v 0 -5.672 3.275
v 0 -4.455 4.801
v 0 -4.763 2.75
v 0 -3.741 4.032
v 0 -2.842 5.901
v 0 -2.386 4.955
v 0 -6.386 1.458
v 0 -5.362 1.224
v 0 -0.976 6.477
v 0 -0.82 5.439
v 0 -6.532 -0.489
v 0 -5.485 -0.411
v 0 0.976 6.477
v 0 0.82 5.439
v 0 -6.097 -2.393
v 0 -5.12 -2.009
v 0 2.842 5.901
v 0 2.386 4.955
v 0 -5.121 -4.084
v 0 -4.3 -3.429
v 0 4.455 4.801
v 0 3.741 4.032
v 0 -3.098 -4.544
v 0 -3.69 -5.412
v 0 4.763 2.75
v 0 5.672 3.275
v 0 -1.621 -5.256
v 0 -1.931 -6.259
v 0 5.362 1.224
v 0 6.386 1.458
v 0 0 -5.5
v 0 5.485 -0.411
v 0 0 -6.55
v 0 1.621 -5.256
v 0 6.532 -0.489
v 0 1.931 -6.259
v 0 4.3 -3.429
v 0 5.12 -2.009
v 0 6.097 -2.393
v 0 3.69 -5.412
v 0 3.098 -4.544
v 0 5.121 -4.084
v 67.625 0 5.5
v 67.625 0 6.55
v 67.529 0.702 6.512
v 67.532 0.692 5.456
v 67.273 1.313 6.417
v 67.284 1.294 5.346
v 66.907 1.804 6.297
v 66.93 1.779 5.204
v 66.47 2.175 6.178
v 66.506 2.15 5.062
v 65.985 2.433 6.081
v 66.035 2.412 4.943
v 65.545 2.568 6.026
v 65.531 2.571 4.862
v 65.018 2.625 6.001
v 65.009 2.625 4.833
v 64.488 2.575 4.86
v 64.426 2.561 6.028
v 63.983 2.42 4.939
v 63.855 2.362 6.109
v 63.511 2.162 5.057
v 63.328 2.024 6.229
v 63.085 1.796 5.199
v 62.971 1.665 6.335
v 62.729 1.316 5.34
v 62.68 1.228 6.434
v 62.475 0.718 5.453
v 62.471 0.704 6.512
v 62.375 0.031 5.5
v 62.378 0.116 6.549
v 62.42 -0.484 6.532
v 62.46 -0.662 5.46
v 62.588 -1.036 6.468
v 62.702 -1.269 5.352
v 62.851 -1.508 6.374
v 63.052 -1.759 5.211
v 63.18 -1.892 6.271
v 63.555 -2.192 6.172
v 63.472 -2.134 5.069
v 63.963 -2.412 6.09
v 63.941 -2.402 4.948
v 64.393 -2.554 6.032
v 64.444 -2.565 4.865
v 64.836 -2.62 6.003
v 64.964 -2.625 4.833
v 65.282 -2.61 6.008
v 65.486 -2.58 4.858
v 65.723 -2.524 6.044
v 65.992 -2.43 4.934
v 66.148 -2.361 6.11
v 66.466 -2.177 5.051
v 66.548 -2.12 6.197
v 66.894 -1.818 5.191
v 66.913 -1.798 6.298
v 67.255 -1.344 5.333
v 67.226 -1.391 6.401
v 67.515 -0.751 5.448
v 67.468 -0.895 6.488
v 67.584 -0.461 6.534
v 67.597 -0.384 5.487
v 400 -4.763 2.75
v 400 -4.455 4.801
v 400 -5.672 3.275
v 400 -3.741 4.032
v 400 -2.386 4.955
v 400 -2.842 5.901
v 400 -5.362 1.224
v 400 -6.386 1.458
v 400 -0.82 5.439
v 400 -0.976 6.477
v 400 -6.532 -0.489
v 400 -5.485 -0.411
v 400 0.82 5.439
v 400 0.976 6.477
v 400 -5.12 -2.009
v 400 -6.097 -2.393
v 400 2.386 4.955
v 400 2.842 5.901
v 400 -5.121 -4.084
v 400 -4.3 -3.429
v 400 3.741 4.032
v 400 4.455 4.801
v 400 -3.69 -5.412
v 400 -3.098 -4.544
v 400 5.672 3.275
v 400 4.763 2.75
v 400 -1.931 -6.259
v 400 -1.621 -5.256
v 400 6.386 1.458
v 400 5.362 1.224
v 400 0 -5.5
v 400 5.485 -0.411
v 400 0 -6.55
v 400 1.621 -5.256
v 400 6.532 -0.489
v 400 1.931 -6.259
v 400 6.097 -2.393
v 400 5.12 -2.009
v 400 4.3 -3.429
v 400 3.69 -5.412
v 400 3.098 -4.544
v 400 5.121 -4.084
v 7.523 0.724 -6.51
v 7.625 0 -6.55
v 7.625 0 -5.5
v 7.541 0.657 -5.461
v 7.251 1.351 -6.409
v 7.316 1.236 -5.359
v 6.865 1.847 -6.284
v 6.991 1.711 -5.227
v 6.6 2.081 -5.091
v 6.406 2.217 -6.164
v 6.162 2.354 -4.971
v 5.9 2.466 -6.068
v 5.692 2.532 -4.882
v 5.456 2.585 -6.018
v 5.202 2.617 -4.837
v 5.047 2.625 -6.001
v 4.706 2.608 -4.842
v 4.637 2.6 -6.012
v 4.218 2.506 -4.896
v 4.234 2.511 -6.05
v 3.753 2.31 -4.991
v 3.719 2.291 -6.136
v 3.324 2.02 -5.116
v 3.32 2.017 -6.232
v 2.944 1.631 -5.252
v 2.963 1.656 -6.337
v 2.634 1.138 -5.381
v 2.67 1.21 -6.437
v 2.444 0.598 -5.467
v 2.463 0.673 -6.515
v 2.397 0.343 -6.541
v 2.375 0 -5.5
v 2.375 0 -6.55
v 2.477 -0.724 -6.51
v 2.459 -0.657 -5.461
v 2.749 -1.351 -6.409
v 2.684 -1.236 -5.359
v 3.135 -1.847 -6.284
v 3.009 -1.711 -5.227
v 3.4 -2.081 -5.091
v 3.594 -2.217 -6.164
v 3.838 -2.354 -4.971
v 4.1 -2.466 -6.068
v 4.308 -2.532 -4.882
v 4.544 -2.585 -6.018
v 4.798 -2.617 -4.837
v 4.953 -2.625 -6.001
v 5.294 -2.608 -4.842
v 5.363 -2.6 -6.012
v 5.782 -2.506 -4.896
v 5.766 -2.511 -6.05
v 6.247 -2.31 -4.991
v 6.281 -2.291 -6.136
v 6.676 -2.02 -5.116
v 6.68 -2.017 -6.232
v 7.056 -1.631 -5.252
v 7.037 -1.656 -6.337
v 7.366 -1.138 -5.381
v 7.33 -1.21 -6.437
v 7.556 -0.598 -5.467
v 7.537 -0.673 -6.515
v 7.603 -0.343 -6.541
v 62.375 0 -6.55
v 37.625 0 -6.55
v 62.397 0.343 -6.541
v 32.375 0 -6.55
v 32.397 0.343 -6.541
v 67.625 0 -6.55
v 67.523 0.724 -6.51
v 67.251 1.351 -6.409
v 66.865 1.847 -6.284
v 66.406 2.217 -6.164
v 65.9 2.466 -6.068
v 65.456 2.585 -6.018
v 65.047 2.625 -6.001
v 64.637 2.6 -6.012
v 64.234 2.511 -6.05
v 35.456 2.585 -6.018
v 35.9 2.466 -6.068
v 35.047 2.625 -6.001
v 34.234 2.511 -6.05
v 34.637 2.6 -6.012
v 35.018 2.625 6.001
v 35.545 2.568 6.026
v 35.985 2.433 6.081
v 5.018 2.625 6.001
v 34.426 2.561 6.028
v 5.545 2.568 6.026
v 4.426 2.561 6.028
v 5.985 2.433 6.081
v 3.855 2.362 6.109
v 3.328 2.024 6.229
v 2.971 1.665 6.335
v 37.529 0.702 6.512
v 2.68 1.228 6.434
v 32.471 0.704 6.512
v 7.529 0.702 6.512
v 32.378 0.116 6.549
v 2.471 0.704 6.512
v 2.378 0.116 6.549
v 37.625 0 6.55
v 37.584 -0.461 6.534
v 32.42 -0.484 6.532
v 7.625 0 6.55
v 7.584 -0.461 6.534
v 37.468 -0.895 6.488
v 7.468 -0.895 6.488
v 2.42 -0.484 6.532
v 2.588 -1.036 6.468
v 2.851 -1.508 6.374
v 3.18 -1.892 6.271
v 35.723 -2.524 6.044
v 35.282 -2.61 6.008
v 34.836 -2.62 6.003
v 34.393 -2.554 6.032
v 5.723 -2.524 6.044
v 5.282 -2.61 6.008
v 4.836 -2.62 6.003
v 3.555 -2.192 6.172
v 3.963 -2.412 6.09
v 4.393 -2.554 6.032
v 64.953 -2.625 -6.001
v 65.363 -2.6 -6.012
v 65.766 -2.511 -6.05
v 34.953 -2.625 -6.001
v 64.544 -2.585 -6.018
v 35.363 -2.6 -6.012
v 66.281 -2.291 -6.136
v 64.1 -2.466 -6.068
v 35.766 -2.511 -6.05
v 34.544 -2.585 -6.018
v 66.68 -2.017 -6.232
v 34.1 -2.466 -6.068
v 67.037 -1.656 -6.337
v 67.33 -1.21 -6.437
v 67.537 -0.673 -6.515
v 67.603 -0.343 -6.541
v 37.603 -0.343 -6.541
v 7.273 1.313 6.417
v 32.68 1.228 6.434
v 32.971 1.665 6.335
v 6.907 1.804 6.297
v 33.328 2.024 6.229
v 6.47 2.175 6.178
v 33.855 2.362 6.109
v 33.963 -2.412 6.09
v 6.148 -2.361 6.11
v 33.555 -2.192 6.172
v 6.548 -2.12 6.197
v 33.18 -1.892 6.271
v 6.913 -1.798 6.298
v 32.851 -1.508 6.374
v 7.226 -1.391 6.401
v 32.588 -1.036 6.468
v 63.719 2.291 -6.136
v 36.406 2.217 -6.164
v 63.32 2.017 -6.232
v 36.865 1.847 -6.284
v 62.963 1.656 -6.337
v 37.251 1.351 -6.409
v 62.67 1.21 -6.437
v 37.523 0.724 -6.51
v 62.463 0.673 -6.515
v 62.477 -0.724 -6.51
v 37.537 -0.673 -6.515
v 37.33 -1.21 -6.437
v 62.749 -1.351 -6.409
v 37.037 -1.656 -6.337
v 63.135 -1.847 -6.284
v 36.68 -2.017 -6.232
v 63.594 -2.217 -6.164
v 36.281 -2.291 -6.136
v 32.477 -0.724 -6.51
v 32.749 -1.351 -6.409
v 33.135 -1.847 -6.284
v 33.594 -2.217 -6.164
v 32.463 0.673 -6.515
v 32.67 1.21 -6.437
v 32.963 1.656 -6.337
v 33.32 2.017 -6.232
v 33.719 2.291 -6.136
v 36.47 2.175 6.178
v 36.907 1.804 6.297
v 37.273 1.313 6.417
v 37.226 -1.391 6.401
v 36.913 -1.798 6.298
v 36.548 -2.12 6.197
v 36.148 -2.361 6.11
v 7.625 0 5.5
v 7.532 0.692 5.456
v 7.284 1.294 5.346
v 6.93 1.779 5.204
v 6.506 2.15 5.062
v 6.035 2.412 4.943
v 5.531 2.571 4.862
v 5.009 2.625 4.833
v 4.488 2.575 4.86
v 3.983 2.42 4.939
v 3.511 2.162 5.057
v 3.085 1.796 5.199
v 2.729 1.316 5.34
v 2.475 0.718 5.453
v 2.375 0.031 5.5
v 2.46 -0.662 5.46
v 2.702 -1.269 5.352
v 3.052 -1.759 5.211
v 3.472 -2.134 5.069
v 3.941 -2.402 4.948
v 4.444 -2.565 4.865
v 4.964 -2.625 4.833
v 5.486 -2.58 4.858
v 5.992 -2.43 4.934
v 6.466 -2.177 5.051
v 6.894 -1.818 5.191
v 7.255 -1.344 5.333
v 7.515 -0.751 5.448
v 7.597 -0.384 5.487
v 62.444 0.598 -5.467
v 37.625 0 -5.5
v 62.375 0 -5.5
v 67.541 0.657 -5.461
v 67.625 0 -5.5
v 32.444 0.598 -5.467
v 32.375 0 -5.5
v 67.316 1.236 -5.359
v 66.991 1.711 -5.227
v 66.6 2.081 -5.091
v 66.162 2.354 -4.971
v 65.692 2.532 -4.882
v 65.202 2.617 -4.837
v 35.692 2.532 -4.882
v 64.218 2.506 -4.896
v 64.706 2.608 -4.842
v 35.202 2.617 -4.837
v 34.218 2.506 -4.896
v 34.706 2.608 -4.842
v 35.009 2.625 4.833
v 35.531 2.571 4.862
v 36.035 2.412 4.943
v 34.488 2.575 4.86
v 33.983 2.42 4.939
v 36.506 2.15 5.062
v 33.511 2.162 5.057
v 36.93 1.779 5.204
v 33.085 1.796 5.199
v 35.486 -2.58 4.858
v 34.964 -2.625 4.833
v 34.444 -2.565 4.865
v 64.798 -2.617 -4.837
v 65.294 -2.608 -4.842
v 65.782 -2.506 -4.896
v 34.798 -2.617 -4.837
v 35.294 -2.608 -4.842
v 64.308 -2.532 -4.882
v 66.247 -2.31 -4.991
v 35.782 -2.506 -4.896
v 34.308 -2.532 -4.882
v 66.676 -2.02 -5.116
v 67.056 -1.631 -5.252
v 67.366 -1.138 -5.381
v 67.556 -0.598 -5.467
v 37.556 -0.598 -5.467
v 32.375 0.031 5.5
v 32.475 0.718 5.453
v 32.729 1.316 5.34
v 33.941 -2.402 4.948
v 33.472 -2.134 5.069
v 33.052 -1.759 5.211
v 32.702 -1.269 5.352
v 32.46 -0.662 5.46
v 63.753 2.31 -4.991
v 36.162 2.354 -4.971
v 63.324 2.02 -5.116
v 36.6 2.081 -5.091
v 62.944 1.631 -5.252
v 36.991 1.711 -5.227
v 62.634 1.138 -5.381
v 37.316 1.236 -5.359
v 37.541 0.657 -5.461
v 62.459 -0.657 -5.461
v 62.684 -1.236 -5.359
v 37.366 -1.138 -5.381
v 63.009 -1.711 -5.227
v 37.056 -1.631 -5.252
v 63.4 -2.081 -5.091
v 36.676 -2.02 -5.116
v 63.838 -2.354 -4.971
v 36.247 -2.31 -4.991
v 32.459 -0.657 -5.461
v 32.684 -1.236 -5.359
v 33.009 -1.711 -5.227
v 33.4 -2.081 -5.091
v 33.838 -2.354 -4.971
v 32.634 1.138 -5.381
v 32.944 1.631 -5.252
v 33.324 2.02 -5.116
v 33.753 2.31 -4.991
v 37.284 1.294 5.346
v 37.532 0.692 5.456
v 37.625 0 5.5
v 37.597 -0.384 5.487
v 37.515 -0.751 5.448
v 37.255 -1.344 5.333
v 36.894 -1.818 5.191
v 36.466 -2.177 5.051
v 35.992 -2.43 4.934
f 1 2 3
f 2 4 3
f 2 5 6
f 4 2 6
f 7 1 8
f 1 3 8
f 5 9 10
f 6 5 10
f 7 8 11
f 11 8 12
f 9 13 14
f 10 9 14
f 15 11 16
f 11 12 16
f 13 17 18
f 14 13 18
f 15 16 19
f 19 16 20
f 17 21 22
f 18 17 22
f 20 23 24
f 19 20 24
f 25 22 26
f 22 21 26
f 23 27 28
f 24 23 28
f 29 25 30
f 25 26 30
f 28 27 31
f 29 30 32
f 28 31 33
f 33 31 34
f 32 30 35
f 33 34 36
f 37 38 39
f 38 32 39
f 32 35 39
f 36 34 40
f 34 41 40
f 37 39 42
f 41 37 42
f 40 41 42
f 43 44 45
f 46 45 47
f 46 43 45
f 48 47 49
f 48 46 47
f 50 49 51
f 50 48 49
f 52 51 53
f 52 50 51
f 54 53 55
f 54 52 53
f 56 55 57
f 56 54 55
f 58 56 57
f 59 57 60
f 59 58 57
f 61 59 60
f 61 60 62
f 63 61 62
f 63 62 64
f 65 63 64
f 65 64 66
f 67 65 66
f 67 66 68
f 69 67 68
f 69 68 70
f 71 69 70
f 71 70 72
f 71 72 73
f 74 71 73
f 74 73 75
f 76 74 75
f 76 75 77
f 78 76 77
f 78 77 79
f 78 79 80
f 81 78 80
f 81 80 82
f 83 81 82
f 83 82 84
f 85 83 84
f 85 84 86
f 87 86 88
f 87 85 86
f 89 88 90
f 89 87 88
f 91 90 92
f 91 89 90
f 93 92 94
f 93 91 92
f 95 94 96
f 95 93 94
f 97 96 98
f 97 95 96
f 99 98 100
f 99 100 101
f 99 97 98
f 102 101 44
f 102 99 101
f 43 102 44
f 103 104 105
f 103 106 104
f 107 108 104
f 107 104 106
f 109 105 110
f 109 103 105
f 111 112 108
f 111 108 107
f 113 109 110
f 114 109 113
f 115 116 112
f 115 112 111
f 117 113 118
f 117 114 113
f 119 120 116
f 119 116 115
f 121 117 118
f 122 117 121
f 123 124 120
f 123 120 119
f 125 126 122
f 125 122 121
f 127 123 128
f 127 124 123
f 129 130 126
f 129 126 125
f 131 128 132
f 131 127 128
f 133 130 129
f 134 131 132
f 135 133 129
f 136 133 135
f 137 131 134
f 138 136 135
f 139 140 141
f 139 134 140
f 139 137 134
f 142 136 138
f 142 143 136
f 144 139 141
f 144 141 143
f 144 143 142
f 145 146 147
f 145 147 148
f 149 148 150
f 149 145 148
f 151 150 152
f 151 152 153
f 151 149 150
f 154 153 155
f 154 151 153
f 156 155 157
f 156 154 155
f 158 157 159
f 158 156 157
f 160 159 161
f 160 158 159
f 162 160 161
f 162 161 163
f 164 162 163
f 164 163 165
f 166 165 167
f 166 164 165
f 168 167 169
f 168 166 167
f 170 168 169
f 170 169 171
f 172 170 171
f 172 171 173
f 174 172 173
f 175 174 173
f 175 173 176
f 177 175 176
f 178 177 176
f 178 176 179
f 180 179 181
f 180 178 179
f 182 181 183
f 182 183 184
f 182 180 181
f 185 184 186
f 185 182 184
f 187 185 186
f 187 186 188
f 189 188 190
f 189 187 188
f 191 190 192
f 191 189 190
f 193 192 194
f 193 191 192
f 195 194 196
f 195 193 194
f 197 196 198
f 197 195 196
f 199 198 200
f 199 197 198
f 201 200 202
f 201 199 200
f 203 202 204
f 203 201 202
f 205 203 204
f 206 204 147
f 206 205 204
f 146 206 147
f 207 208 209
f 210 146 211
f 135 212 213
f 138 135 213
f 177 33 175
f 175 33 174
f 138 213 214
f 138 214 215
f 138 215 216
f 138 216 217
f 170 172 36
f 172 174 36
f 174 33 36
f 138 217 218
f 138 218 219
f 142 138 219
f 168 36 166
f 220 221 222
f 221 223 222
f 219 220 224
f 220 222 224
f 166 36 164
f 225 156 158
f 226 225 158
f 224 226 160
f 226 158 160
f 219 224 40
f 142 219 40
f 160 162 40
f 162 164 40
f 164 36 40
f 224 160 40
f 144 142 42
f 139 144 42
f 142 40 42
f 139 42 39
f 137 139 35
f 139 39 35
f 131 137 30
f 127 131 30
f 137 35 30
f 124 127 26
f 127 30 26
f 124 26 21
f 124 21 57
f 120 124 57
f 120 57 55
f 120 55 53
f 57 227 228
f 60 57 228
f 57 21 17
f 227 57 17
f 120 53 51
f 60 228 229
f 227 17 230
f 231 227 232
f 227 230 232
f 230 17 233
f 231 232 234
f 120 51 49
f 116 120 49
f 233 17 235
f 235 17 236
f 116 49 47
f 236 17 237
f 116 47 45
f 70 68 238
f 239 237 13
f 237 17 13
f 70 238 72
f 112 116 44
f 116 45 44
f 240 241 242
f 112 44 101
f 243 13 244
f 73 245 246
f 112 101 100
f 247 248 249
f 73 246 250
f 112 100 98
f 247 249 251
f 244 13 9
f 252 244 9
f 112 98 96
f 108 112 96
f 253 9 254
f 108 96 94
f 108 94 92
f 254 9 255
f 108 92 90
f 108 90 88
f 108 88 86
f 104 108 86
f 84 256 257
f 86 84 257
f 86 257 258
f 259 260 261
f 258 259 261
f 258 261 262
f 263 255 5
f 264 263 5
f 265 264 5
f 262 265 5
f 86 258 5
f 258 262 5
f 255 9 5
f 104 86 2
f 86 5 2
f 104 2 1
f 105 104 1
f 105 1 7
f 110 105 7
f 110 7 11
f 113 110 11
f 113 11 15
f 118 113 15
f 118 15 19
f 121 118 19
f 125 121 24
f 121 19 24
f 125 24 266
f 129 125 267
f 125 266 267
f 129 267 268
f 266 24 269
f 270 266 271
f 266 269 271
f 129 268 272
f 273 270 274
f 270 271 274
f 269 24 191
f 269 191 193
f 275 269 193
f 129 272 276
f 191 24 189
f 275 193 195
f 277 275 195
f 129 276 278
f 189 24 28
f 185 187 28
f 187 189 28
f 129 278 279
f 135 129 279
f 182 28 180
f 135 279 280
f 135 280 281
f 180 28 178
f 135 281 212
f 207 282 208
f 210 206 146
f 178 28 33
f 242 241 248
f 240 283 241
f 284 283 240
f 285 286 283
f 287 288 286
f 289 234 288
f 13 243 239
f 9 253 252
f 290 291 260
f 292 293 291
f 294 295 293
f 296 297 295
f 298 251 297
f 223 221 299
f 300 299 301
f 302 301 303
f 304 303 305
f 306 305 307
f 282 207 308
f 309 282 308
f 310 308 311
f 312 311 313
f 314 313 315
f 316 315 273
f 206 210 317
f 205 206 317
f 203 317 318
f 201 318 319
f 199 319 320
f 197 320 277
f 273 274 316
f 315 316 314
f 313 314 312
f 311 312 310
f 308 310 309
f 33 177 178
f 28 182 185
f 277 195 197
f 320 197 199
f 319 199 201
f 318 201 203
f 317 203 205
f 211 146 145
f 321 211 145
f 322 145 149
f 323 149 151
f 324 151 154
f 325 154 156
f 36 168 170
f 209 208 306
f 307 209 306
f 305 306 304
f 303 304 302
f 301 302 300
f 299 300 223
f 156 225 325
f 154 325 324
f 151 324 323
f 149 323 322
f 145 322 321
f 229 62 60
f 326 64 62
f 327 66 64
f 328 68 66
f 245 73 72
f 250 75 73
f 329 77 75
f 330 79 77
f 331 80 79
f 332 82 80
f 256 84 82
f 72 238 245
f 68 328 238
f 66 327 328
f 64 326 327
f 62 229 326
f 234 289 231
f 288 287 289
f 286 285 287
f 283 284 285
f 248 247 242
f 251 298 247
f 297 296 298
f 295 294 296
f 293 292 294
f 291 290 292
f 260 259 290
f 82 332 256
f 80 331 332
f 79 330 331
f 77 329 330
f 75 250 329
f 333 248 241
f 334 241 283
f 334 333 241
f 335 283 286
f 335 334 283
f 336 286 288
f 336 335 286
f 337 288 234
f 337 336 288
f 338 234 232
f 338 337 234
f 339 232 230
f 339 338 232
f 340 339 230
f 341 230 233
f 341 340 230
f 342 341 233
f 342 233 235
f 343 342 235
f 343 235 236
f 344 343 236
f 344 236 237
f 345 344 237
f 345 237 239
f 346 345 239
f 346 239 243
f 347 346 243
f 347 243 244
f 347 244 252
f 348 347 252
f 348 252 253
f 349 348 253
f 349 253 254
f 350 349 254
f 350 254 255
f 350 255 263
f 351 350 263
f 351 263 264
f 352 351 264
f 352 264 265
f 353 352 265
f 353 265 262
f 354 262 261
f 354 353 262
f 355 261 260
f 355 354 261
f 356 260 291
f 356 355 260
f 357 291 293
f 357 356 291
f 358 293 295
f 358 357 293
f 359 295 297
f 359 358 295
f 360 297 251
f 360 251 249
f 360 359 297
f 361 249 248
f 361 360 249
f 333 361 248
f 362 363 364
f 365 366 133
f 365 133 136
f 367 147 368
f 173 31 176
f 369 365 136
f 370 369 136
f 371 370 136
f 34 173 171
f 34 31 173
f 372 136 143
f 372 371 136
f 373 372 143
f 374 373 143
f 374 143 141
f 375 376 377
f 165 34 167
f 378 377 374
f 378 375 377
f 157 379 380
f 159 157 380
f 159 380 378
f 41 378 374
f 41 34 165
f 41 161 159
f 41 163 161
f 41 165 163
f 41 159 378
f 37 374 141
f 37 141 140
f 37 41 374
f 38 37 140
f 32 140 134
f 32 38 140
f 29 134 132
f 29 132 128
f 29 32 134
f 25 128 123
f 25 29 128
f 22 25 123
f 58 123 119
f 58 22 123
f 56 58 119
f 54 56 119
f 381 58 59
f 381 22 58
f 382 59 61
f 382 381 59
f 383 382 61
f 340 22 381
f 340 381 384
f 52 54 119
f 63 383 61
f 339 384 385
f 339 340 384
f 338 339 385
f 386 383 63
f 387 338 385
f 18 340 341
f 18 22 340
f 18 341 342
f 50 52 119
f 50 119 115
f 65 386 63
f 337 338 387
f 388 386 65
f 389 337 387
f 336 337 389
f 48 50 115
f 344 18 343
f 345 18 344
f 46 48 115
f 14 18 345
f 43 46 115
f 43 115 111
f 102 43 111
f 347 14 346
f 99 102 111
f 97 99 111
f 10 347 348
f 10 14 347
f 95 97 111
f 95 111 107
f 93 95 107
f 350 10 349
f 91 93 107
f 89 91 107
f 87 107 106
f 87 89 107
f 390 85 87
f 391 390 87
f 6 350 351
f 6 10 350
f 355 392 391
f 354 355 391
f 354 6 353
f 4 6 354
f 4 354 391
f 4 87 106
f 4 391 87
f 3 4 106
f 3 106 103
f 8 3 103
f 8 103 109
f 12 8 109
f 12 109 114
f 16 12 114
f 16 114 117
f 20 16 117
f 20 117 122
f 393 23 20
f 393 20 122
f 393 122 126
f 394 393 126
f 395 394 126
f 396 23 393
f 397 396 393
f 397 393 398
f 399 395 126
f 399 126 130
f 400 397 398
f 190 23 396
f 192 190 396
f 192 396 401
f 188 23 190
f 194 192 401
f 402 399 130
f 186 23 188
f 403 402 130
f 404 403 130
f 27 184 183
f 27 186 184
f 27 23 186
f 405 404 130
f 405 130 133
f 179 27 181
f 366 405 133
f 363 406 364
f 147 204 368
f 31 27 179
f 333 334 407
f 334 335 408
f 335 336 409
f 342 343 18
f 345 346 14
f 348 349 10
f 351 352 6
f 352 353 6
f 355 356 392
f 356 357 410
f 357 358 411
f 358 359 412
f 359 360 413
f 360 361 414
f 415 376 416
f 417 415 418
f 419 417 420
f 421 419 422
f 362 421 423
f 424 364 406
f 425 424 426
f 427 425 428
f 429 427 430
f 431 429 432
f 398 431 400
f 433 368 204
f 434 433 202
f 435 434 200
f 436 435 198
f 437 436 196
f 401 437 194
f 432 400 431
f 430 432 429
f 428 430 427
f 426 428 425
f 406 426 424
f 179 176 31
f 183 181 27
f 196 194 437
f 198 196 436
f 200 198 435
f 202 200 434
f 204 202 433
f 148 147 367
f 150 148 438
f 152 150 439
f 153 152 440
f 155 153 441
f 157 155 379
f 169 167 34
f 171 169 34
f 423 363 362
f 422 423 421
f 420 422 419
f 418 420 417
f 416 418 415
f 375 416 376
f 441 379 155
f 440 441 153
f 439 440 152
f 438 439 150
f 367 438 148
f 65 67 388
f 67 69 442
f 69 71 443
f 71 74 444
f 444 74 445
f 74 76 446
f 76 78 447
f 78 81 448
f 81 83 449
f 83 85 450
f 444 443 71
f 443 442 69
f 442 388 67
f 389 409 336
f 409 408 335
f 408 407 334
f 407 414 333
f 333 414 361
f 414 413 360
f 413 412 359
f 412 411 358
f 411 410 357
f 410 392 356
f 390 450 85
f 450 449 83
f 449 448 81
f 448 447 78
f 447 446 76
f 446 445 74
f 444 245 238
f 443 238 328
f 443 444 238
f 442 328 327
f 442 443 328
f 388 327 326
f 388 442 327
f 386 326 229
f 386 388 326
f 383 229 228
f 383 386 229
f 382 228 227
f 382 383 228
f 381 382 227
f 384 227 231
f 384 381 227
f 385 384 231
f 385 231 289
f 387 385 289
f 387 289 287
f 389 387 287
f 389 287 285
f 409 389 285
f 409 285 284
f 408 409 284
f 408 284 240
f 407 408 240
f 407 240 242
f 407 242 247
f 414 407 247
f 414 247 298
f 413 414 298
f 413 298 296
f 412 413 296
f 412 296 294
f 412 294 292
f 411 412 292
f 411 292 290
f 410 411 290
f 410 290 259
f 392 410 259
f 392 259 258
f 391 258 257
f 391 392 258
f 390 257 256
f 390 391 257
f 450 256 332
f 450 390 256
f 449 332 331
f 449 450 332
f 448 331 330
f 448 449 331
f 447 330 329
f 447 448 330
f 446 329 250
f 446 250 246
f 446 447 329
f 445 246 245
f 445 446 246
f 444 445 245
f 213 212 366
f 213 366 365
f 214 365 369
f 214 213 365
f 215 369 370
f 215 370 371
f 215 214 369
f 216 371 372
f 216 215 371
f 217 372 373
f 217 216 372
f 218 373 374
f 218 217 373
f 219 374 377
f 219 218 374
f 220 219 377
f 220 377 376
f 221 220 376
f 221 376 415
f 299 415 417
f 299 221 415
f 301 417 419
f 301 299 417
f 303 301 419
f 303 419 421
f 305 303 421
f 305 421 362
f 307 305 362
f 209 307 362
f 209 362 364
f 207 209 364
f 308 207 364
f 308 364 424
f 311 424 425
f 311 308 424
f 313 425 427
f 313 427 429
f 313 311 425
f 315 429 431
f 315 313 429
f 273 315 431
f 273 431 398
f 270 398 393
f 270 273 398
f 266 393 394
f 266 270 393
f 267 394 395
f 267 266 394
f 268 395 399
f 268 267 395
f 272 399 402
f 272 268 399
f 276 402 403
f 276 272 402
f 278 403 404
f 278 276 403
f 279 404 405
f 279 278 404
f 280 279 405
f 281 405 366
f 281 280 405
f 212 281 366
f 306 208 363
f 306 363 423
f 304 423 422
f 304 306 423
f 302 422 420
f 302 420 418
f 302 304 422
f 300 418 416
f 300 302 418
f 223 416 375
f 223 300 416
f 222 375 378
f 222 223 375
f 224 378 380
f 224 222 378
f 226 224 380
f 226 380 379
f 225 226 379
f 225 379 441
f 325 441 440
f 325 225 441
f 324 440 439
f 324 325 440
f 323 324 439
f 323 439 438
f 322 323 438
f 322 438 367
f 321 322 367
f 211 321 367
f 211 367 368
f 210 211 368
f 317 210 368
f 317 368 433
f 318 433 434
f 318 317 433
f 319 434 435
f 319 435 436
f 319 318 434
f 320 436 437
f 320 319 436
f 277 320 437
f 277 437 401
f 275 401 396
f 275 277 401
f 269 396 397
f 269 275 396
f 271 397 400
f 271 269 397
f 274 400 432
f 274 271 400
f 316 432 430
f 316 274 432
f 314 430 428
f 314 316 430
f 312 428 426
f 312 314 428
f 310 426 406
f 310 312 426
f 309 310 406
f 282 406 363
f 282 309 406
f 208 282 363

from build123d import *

# Parameters (mm, degrees)
SKETCH1_R               = 6.55
SKETCH1_R_2             = 5.5
BOSS_EXTRUDE1_DEPTH     = 400
CUT_EXTRUDE1_DEPTH      = 401.107241874
CUT_EXTRUDE1_DEPTH_BACK = 401.107241874
SKETCH2_R               = 2.625


with BuildPart() as part:
    # Sketch1 → Boss-Extrude1 (new body)
    with BuildSketch(Plane(origin=(0, 0, 0), x_dir=(0, 0, -1), z_dir=(1, 0, 0))):
        Circle(SKETCH1_R)
        Circle(SKETCH1_R_2, mode=Mode.SUBTRACT)
    extrude(amount=BOSS_EXTRUDE1_DEPTH)

    # Sketch2 → Cut-Extrude1 (cut, two sides: drawn at the far end of the back side and taken through both)
    with BuildSketch(Plane.XY.offset(-CUT_EXTRUDE1_DEPTH_BACK)):
        with Locations((5, 0)):
            Circle(SKETCH2_R)
        with Locations((35, 0)):
            Circle(SKETCH2_R)
        with Locations((65, 0)):
            Circle(SKETCH2_R)
    extrude(amount=CUT_EXTRUDE1_DEPTH + CUT_EXTRUDE1_DEPTH_BACK, mode=Mode.SUBTRACT)


solid = part.part
